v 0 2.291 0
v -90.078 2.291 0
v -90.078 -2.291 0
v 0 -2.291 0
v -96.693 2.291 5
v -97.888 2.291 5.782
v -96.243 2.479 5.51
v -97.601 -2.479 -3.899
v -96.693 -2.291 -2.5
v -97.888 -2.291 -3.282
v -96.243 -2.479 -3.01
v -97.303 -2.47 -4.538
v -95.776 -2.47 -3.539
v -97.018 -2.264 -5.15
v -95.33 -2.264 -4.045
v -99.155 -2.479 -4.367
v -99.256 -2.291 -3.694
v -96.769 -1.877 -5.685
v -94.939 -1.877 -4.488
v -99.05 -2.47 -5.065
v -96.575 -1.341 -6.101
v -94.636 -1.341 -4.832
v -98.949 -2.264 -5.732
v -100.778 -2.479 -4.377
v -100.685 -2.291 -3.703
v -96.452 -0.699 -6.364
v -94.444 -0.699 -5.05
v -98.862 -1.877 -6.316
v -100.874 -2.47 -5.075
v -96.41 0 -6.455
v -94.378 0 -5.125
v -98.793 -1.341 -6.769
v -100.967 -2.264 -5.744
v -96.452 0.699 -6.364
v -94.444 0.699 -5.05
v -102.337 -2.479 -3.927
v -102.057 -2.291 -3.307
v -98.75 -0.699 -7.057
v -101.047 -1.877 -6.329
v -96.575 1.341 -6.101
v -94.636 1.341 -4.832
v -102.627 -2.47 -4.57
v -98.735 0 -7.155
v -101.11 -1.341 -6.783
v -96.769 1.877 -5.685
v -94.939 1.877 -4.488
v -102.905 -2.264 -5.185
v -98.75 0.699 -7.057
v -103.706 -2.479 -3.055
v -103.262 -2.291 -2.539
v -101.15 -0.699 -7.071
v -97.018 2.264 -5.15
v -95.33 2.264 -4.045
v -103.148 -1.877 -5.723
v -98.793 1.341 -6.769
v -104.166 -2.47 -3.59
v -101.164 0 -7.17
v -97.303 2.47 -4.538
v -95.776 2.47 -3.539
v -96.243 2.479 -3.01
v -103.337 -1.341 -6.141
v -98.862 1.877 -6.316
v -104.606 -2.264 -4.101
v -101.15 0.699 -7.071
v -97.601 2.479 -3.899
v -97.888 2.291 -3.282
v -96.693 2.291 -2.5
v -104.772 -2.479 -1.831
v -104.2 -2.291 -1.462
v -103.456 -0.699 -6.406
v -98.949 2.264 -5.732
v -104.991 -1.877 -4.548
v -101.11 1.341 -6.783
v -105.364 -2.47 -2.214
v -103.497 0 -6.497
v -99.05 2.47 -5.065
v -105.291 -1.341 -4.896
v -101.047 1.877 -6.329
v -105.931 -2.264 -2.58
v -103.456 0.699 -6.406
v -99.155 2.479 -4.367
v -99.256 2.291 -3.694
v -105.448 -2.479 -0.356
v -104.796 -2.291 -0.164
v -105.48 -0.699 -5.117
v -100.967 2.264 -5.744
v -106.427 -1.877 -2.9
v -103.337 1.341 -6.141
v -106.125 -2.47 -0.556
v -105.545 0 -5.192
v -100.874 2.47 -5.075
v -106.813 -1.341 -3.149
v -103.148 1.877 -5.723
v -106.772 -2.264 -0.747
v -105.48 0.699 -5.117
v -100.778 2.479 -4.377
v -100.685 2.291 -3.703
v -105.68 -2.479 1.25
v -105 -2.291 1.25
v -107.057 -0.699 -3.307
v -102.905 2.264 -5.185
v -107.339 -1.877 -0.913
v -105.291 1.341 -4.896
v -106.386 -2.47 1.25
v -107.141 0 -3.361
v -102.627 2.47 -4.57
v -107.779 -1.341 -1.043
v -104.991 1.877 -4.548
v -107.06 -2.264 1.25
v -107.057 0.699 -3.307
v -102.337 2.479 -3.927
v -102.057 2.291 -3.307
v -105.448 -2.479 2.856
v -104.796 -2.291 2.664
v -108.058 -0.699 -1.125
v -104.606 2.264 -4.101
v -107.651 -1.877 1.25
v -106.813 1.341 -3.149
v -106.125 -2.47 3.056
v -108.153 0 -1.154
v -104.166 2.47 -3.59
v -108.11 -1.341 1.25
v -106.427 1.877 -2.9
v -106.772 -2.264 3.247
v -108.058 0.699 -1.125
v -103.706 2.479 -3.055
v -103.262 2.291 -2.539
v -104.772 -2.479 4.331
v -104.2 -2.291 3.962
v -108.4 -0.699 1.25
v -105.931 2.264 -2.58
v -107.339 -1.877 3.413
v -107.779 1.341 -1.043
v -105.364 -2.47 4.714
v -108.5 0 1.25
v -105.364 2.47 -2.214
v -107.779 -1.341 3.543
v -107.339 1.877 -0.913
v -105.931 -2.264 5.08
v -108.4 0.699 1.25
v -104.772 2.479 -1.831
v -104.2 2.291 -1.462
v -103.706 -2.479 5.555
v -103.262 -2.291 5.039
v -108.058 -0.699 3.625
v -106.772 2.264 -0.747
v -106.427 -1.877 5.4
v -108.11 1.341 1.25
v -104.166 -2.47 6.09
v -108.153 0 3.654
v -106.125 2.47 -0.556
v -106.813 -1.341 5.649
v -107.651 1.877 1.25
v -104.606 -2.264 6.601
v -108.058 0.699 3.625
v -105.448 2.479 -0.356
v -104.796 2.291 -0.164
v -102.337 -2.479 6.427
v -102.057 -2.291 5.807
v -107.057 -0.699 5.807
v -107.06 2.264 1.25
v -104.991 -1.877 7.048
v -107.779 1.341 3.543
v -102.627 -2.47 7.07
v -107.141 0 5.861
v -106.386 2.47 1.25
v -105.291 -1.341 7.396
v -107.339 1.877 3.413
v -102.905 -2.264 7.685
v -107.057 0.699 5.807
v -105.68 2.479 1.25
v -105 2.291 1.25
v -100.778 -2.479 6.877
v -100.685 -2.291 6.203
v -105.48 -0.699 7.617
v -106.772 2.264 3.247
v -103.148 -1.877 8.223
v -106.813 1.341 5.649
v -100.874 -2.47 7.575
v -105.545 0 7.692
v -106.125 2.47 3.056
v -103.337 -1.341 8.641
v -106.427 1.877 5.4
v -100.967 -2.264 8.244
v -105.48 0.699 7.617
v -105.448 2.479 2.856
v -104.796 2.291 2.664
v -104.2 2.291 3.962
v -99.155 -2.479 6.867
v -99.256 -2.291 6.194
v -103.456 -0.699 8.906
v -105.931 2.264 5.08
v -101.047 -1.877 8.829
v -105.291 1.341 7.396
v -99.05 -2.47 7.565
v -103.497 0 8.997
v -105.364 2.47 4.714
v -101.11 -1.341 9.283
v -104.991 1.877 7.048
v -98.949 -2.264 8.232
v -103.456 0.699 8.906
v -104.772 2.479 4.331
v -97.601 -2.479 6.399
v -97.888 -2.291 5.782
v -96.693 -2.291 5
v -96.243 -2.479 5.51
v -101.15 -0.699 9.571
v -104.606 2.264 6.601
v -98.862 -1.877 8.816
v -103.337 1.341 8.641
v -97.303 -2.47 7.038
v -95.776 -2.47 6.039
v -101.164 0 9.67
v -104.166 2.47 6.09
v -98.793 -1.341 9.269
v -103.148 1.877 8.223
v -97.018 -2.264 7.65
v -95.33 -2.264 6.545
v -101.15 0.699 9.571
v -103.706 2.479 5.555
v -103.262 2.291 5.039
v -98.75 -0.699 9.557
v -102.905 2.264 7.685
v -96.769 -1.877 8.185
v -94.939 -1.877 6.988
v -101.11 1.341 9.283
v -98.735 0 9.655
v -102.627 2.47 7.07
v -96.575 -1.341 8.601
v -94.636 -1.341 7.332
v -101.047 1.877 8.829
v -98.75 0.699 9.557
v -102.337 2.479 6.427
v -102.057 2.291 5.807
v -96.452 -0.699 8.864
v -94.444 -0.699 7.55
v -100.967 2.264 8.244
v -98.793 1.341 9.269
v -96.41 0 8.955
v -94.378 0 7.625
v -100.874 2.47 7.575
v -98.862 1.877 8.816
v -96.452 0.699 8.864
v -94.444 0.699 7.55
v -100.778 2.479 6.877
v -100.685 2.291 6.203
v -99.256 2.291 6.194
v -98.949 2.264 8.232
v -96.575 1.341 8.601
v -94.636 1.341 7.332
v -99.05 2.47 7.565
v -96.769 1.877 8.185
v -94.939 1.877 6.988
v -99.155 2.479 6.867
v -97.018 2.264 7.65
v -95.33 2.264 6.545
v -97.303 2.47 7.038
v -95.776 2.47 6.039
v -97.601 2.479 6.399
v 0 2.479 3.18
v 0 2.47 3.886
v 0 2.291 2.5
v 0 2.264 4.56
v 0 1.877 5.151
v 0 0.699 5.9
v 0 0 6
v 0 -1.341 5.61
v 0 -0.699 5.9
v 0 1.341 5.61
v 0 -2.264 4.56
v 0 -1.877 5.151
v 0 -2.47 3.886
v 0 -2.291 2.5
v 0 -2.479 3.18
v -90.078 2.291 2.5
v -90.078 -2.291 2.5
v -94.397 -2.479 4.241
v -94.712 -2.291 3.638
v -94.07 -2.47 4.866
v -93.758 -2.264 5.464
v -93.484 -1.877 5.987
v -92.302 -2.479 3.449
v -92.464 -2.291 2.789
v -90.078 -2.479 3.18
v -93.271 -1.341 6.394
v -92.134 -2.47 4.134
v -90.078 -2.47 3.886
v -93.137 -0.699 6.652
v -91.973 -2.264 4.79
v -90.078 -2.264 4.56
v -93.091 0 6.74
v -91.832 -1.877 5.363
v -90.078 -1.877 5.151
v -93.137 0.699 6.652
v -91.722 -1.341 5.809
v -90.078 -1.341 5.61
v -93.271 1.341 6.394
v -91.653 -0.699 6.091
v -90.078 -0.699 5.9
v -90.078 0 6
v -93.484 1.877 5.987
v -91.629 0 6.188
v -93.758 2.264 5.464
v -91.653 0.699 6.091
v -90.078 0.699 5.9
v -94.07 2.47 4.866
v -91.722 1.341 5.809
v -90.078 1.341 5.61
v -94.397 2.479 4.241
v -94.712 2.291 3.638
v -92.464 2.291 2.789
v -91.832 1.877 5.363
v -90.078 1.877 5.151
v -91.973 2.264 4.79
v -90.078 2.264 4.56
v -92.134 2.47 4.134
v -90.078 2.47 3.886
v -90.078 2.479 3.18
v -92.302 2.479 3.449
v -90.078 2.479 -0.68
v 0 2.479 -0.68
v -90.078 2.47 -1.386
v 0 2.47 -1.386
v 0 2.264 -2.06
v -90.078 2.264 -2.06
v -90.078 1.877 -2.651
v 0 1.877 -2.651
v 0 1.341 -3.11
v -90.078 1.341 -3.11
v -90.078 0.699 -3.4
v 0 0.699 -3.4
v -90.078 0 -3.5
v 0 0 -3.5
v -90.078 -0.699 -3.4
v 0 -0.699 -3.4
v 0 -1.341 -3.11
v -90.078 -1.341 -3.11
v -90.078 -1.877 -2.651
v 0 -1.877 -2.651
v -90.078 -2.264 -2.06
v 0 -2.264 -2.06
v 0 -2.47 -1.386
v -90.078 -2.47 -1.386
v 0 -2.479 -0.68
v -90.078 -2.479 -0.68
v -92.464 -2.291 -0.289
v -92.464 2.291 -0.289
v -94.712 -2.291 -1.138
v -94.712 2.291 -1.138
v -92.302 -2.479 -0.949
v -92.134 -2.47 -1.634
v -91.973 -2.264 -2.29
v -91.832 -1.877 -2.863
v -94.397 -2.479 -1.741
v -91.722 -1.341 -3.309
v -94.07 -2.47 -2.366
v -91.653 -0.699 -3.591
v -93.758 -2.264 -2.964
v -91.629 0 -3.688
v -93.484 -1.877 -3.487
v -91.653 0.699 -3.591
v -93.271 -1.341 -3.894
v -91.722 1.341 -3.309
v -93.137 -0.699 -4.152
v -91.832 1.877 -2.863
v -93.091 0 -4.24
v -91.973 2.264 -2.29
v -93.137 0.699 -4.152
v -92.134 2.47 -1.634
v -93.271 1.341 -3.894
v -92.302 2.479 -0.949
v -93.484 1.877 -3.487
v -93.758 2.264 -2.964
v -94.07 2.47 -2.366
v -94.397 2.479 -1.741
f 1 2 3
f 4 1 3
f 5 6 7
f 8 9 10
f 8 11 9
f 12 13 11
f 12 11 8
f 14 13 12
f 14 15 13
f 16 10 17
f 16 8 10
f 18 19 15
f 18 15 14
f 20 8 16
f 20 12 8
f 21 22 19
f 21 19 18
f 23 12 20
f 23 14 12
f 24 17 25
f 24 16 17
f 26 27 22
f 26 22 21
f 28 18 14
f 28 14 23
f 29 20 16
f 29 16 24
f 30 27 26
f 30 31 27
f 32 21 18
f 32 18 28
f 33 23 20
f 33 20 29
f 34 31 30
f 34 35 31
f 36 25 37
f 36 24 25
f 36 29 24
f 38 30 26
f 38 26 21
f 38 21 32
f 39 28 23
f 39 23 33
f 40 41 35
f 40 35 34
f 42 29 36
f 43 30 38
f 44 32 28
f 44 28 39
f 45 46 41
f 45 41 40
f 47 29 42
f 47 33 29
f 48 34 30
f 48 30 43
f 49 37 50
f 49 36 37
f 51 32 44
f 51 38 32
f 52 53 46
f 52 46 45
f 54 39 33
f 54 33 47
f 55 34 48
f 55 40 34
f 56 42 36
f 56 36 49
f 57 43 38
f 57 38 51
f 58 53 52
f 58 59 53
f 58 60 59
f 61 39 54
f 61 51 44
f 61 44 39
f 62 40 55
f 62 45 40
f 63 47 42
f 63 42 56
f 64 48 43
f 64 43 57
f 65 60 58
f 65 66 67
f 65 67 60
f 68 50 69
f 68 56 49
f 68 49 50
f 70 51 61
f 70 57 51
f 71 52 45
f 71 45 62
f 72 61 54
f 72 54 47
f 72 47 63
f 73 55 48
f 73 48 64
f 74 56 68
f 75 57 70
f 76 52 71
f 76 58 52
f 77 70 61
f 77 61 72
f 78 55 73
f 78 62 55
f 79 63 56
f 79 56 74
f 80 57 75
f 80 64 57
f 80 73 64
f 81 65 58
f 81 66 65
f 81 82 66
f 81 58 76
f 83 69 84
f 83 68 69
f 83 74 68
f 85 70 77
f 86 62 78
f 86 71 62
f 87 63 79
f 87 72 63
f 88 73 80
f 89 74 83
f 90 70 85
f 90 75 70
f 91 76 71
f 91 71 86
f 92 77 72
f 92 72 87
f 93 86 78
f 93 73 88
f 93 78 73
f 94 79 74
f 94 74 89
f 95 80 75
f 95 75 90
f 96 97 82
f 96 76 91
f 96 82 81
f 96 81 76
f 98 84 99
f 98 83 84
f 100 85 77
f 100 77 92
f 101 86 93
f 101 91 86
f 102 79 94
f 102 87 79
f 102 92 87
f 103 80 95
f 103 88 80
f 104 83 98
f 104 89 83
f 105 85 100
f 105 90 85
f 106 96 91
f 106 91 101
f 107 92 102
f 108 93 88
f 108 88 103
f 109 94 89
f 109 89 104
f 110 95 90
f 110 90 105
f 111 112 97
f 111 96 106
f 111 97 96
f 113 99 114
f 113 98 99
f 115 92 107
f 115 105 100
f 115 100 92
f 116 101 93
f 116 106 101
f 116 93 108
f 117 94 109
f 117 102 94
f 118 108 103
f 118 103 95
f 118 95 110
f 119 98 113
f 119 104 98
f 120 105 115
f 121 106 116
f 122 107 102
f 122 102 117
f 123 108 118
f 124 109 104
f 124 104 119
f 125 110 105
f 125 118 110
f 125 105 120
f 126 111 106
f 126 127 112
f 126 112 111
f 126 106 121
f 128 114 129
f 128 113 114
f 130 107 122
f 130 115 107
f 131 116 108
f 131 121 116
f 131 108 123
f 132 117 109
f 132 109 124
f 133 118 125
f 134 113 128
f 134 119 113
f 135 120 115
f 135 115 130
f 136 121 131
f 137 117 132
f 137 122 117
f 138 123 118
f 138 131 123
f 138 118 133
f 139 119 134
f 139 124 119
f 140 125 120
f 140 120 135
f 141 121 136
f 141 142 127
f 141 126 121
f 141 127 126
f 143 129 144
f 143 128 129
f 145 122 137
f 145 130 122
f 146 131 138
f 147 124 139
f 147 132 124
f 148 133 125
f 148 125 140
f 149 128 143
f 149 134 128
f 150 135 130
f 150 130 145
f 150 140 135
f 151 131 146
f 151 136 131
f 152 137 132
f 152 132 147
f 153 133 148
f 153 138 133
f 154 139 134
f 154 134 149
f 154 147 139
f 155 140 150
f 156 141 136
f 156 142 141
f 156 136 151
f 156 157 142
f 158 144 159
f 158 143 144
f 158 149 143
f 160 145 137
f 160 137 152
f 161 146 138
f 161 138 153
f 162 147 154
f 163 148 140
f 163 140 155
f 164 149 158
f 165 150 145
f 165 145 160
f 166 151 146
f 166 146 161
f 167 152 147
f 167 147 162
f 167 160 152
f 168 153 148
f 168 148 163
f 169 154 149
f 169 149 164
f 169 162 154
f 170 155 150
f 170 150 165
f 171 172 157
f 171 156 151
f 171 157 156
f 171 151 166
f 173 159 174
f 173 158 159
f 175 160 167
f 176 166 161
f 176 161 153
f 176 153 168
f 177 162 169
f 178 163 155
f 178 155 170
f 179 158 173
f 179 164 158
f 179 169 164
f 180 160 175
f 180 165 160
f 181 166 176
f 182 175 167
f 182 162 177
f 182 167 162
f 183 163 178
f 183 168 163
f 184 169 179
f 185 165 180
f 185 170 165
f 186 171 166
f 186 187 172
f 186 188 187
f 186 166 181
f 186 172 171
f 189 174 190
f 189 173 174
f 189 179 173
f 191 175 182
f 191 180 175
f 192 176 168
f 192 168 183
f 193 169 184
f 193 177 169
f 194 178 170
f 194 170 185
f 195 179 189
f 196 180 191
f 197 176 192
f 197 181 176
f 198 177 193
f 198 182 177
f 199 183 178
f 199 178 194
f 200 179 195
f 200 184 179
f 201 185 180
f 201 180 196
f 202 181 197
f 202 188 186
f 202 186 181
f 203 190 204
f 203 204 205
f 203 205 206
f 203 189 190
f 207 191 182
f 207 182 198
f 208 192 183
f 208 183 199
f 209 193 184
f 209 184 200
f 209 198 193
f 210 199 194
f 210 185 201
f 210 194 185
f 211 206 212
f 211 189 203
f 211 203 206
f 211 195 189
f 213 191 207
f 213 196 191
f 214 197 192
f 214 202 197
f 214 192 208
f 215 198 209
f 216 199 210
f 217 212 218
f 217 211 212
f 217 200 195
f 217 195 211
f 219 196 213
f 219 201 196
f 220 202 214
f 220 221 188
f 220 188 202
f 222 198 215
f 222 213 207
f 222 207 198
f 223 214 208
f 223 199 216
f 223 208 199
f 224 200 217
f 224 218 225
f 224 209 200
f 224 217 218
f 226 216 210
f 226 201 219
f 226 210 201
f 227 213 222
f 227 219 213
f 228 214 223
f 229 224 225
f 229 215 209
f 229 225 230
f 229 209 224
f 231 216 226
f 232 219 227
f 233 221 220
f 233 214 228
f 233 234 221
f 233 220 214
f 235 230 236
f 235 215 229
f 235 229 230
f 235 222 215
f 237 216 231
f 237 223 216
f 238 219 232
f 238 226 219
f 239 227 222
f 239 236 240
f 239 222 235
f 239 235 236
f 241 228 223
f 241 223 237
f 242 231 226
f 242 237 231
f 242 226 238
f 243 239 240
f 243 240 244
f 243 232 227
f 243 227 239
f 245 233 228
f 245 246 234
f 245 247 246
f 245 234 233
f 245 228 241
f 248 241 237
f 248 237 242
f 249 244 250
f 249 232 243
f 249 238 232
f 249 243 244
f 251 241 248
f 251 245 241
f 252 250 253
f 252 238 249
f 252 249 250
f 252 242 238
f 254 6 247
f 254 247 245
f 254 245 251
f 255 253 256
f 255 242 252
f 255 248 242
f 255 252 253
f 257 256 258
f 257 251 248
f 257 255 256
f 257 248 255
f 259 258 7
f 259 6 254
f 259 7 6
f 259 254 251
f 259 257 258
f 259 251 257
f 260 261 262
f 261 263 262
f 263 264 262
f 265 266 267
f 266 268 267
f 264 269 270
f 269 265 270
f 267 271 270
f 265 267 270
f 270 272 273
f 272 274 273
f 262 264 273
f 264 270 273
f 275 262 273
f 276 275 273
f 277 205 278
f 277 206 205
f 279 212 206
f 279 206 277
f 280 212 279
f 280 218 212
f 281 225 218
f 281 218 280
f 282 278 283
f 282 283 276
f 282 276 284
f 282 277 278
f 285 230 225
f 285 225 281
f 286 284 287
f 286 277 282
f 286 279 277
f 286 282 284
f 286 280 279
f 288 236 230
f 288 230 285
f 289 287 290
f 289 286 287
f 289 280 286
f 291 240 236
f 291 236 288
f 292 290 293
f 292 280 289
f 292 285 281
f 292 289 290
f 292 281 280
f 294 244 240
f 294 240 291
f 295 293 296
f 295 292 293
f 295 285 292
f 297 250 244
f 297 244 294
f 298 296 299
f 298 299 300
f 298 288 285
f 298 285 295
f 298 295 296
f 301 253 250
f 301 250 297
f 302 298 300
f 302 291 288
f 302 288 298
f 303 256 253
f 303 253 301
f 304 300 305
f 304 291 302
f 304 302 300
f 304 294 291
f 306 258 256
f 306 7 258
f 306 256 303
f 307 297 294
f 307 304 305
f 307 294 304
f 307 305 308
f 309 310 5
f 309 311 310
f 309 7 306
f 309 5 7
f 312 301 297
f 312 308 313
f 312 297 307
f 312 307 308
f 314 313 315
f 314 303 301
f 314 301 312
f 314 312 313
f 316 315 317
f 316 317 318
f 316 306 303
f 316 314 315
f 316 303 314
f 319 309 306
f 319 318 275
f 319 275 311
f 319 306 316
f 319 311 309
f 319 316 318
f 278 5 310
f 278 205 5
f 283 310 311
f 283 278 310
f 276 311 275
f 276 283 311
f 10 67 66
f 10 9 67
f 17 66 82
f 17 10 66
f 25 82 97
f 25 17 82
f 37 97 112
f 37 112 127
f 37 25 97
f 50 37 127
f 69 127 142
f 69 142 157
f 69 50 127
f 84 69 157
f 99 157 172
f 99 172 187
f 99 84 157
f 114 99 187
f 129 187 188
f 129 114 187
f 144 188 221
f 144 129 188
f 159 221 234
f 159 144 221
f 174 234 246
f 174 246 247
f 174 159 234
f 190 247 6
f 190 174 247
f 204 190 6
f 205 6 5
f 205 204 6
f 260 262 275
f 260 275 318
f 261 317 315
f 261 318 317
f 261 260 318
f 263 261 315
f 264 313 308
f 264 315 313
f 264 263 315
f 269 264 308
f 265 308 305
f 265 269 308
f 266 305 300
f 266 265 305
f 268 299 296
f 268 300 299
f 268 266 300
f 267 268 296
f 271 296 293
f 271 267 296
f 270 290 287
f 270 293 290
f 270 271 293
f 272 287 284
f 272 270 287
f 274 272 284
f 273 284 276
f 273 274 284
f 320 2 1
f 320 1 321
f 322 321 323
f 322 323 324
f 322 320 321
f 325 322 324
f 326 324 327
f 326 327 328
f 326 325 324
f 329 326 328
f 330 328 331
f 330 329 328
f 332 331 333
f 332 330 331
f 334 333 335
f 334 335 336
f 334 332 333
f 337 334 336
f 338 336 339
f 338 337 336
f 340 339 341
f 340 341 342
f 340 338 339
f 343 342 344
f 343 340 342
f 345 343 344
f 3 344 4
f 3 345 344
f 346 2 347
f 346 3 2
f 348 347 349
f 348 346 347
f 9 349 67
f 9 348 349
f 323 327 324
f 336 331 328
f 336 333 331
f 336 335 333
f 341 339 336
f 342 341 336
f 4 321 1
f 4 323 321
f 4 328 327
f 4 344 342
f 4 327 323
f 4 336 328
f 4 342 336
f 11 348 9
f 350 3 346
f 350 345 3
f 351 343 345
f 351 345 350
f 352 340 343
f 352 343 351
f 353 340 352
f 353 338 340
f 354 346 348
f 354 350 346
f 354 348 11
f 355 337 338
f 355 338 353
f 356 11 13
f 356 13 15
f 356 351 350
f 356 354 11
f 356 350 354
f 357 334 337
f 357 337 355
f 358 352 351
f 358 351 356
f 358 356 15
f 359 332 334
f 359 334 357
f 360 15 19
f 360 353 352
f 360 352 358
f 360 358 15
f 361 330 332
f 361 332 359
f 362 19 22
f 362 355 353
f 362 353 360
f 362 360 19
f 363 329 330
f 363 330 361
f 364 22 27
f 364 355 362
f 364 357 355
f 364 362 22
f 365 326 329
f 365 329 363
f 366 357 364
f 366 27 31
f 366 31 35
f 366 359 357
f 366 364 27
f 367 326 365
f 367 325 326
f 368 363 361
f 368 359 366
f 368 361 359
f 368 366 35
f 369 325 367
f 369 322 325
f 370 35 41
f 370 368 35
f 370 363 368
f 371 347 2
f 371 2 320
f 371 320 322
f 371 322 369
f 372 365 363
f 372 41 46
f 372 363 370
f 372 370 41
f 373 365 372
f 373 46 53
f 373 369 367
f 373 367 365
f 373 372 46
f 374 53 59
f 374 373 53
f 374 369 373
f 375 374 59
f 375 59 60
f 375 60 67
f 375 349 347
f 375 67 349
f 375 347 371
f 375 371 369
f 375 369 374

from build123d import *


with BuildPart() as part:
    # Sweep1: sweep along a path in Sketch1
    with BuildLine(Plane(origin=(0, 0, 0), x_dir=(1, 0, 0), z_dir=(0, 1, 0))) as sweep1_path:
        Line((0, 0), (-90.078432584, 0))
        ThreePointArc((-90.078432584, 0), (-93.613966489, 0.645856533), (-96.692810861, 2.5))
        ThreePointArc((-96.692810861, 2.5), (-105, -1.25), (-96.692810861, -5))
        ThreePointArc((-96.692810861, -5), (-93.613966489, -3.145856533), (-90.078432584, -2.5))
        Line((-90.078432584, -2.5), (0, -2.5))
    # Sketch2 → Sweep1 (sweep)
    with BuildSketch(Plane(origin=(0, 0, 0), x_dir=(0, 0, -1), z_dir=(1, 0, 0))):
        with BuildLine():
            Line((0, -2.291287847), (0, 2.291287847))
            ThreePointArc((0, 2.291287847), (3.5, 0), (0, -2.291287847))
        make_face()
    sweep(path=sweep1_path.line)


solid = part.part
